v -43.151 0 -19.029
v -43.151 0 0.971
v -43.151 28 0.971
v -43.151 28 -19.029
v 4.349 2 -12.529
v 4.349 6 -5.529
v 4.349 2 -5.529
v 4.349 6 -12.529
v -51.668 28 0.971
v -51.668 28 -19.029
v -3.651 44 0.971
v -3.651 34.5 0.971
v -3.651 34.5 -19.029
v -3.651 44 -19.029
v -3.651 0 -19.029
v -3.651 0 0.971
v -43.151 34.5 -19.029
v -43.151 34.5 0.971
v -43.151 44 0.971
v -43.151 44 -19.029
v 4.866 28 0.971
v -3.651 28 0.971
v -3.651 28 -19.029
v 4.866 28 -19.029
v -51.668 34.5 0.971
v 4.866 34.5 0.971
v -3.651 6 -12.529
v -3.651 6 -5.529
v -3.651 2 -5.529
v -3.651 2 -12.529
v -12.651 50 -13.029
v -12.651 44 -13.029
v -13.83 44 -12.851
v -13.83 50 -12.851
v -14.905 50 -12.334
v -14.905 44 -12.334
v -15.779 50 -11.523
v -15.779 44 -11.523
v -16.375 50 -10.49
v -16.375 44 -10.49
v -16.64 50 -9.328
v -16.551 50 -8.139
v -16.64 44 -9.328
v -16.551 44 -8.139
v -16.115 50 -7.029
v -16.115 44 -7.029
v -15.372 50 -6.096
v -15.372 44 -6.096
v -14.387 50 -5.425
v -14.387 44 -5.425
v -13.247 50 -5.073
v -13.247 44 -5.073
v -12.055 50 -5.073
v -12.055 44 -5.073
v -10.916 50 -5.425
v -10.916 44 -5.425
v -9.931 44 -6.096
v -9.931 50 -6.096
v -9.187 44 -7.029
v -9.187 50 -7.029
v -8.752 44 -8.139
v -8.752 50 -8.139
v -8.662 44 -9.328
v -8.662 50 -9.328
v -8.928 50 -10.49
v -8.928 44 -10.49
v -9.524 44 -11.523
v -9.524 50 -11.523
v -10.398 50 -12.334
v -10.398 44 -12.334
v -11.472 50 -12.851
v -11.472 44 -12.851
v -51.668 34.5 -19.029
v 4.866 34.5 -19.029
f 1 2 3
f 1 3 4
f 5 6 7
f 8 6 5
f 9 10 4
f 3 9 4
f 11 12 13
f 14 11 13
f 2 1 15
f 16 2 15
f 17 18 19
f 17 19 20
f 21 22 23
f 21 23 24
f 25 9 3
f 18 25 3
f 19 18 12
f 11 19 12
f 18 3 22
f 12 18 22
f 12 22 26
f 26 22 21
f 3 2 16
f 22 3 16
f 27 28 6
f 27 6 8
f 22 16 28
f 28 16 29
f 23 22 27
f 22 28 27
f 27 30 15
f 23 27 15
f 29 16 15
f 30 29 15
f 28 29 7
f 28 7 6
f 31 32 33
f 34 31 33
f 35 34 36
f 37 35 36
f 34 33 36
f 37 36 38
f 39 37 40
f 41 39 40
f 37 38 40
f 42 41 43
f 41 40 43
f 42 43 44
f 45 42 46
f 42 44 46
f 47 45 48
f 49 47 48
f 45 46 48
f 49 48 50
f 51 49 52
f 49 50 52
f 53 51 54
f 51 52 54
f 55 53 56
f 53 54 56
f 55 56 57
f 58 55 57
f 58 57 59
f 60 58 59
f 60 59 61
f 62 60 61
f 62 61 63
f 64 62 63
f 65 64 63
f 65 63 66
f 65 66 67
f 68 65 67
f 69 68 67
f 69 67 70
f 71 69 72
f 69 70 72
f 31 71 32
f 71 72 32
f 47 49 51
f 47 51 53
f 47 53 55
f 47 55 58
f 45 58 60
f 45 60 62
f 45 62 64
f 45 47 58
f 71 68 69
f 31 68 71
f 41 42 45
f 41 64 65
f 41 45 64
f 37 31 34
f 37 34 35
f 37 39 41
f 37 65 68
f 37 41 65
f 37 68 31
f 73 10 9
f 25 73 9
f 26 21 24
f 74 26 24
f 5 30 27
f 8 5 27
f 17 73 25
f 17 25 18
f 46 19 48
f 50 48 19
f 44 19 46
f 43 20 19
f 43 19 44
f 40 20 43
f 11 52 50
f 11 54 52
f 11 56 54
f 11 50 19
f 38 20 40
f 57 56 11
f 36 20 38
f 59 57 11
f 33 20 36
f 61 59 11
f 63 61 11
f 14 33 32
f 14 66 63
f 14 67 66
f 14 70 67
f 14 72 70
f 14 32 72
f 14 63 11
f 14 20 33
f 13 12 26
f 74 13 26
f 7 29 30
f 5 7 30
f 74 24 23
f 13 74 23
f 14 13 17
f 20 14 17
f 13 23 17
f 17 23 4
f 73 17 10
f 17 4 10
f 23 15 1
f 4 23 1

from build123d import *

# Parameters (mm, degrees)
SKETCH1_W           = 39.5
SKETCH1_H           = 20
BOSS_EXTRUDE1_DEPTH = 28
BOSS_EXTRUDE2_DEPTH = 6.5
SKETCH3_W           = 39.5
SKETCH3_H           = 20
BOSS_EXTRUDE3_DEPTH = 9.5
SKETCH4_R           = 4
BOSS_EXTRUDE4_DEPTH = 6
SKETCH5_W           = 7
SKETCH5_H           = 4
BOSS_EXTRUDE5_DEPTH = 8


with BuildPart() as part:
    # Sketch1 → Boss-Extrude1 (new body)
    with BuildSketch(Plane(origin=(0, 0, 0), x_dir=(1, 0, 0), z_dir=(0, 1, 0))):
        with Locations((-23.401244555, 9.028670505)):
            Rectangle(SKETCH1_W, SKETCH1_H)
    extrude(amount=BOSS_EXTRUDE1_DEPTH)

    # Sketch2 → Boss-Extrude2 (add)
    with BuildSketch(Plane(origin=(0, 28, 0), x_dir=(1, 0, 0), z_dir=(0, 1, 0))):
        Polygon((-43.151244555, 19.028670505), (-51.668180021, 19.028670505), (-51.668180021, -0.971329495), (-43.151244555, -0.971329495), (-3.651244555, -0.971329495), (4.86569091, -0.971329495), (4.86569091, 19.028670505), (-3.651244555, 19.028670505), align=None)
    extrude(amount=BOSS_EXTRUDE2_DEPTH)

    # Sketch3 → Boss-Extrude3 (add)
    with BuildSketch(Plane(origin=(0, 34.5, 0), x_dir=(1, 0, 0), z_dir=(0, 1, 0))):
        with Locations((-23.401244555, 9.028670505)):
            Rectangle(SKETCH3_W, SKETCH3_H)
    extrude(amount=BOSS_EXTRUDE3_DEPTH)

    # Sketch4 → Boss-Extrude4 (add)
    with BuildSketch(Plane(origin=(0, 44, 0), x_dir=(1, 0, 0), z_dir=(0, 1, 0))):
        with Locations(Location((-12.651244555, 9.028670505, 0), (0, 0, 90))):
            Circle(SKETCH4_R)
    extrude(amount=BOSS_EXTRUDE4_DEPTH)

    # Sketch5 → Boss-Extrude5 (add)
    with BuildSketch(Plane(origin=(-3.651244555, 0, 0), x_dir=(0, 0, -1), z_dir=(1, 0, 0))):
        with Locations((9.028670505, 4)):
            Rectangle(SKETCH5_W, SKETCH5_H)
    extrude(amount=BOSS_EXTRUDE5_DEPTH)


solid = part.part
